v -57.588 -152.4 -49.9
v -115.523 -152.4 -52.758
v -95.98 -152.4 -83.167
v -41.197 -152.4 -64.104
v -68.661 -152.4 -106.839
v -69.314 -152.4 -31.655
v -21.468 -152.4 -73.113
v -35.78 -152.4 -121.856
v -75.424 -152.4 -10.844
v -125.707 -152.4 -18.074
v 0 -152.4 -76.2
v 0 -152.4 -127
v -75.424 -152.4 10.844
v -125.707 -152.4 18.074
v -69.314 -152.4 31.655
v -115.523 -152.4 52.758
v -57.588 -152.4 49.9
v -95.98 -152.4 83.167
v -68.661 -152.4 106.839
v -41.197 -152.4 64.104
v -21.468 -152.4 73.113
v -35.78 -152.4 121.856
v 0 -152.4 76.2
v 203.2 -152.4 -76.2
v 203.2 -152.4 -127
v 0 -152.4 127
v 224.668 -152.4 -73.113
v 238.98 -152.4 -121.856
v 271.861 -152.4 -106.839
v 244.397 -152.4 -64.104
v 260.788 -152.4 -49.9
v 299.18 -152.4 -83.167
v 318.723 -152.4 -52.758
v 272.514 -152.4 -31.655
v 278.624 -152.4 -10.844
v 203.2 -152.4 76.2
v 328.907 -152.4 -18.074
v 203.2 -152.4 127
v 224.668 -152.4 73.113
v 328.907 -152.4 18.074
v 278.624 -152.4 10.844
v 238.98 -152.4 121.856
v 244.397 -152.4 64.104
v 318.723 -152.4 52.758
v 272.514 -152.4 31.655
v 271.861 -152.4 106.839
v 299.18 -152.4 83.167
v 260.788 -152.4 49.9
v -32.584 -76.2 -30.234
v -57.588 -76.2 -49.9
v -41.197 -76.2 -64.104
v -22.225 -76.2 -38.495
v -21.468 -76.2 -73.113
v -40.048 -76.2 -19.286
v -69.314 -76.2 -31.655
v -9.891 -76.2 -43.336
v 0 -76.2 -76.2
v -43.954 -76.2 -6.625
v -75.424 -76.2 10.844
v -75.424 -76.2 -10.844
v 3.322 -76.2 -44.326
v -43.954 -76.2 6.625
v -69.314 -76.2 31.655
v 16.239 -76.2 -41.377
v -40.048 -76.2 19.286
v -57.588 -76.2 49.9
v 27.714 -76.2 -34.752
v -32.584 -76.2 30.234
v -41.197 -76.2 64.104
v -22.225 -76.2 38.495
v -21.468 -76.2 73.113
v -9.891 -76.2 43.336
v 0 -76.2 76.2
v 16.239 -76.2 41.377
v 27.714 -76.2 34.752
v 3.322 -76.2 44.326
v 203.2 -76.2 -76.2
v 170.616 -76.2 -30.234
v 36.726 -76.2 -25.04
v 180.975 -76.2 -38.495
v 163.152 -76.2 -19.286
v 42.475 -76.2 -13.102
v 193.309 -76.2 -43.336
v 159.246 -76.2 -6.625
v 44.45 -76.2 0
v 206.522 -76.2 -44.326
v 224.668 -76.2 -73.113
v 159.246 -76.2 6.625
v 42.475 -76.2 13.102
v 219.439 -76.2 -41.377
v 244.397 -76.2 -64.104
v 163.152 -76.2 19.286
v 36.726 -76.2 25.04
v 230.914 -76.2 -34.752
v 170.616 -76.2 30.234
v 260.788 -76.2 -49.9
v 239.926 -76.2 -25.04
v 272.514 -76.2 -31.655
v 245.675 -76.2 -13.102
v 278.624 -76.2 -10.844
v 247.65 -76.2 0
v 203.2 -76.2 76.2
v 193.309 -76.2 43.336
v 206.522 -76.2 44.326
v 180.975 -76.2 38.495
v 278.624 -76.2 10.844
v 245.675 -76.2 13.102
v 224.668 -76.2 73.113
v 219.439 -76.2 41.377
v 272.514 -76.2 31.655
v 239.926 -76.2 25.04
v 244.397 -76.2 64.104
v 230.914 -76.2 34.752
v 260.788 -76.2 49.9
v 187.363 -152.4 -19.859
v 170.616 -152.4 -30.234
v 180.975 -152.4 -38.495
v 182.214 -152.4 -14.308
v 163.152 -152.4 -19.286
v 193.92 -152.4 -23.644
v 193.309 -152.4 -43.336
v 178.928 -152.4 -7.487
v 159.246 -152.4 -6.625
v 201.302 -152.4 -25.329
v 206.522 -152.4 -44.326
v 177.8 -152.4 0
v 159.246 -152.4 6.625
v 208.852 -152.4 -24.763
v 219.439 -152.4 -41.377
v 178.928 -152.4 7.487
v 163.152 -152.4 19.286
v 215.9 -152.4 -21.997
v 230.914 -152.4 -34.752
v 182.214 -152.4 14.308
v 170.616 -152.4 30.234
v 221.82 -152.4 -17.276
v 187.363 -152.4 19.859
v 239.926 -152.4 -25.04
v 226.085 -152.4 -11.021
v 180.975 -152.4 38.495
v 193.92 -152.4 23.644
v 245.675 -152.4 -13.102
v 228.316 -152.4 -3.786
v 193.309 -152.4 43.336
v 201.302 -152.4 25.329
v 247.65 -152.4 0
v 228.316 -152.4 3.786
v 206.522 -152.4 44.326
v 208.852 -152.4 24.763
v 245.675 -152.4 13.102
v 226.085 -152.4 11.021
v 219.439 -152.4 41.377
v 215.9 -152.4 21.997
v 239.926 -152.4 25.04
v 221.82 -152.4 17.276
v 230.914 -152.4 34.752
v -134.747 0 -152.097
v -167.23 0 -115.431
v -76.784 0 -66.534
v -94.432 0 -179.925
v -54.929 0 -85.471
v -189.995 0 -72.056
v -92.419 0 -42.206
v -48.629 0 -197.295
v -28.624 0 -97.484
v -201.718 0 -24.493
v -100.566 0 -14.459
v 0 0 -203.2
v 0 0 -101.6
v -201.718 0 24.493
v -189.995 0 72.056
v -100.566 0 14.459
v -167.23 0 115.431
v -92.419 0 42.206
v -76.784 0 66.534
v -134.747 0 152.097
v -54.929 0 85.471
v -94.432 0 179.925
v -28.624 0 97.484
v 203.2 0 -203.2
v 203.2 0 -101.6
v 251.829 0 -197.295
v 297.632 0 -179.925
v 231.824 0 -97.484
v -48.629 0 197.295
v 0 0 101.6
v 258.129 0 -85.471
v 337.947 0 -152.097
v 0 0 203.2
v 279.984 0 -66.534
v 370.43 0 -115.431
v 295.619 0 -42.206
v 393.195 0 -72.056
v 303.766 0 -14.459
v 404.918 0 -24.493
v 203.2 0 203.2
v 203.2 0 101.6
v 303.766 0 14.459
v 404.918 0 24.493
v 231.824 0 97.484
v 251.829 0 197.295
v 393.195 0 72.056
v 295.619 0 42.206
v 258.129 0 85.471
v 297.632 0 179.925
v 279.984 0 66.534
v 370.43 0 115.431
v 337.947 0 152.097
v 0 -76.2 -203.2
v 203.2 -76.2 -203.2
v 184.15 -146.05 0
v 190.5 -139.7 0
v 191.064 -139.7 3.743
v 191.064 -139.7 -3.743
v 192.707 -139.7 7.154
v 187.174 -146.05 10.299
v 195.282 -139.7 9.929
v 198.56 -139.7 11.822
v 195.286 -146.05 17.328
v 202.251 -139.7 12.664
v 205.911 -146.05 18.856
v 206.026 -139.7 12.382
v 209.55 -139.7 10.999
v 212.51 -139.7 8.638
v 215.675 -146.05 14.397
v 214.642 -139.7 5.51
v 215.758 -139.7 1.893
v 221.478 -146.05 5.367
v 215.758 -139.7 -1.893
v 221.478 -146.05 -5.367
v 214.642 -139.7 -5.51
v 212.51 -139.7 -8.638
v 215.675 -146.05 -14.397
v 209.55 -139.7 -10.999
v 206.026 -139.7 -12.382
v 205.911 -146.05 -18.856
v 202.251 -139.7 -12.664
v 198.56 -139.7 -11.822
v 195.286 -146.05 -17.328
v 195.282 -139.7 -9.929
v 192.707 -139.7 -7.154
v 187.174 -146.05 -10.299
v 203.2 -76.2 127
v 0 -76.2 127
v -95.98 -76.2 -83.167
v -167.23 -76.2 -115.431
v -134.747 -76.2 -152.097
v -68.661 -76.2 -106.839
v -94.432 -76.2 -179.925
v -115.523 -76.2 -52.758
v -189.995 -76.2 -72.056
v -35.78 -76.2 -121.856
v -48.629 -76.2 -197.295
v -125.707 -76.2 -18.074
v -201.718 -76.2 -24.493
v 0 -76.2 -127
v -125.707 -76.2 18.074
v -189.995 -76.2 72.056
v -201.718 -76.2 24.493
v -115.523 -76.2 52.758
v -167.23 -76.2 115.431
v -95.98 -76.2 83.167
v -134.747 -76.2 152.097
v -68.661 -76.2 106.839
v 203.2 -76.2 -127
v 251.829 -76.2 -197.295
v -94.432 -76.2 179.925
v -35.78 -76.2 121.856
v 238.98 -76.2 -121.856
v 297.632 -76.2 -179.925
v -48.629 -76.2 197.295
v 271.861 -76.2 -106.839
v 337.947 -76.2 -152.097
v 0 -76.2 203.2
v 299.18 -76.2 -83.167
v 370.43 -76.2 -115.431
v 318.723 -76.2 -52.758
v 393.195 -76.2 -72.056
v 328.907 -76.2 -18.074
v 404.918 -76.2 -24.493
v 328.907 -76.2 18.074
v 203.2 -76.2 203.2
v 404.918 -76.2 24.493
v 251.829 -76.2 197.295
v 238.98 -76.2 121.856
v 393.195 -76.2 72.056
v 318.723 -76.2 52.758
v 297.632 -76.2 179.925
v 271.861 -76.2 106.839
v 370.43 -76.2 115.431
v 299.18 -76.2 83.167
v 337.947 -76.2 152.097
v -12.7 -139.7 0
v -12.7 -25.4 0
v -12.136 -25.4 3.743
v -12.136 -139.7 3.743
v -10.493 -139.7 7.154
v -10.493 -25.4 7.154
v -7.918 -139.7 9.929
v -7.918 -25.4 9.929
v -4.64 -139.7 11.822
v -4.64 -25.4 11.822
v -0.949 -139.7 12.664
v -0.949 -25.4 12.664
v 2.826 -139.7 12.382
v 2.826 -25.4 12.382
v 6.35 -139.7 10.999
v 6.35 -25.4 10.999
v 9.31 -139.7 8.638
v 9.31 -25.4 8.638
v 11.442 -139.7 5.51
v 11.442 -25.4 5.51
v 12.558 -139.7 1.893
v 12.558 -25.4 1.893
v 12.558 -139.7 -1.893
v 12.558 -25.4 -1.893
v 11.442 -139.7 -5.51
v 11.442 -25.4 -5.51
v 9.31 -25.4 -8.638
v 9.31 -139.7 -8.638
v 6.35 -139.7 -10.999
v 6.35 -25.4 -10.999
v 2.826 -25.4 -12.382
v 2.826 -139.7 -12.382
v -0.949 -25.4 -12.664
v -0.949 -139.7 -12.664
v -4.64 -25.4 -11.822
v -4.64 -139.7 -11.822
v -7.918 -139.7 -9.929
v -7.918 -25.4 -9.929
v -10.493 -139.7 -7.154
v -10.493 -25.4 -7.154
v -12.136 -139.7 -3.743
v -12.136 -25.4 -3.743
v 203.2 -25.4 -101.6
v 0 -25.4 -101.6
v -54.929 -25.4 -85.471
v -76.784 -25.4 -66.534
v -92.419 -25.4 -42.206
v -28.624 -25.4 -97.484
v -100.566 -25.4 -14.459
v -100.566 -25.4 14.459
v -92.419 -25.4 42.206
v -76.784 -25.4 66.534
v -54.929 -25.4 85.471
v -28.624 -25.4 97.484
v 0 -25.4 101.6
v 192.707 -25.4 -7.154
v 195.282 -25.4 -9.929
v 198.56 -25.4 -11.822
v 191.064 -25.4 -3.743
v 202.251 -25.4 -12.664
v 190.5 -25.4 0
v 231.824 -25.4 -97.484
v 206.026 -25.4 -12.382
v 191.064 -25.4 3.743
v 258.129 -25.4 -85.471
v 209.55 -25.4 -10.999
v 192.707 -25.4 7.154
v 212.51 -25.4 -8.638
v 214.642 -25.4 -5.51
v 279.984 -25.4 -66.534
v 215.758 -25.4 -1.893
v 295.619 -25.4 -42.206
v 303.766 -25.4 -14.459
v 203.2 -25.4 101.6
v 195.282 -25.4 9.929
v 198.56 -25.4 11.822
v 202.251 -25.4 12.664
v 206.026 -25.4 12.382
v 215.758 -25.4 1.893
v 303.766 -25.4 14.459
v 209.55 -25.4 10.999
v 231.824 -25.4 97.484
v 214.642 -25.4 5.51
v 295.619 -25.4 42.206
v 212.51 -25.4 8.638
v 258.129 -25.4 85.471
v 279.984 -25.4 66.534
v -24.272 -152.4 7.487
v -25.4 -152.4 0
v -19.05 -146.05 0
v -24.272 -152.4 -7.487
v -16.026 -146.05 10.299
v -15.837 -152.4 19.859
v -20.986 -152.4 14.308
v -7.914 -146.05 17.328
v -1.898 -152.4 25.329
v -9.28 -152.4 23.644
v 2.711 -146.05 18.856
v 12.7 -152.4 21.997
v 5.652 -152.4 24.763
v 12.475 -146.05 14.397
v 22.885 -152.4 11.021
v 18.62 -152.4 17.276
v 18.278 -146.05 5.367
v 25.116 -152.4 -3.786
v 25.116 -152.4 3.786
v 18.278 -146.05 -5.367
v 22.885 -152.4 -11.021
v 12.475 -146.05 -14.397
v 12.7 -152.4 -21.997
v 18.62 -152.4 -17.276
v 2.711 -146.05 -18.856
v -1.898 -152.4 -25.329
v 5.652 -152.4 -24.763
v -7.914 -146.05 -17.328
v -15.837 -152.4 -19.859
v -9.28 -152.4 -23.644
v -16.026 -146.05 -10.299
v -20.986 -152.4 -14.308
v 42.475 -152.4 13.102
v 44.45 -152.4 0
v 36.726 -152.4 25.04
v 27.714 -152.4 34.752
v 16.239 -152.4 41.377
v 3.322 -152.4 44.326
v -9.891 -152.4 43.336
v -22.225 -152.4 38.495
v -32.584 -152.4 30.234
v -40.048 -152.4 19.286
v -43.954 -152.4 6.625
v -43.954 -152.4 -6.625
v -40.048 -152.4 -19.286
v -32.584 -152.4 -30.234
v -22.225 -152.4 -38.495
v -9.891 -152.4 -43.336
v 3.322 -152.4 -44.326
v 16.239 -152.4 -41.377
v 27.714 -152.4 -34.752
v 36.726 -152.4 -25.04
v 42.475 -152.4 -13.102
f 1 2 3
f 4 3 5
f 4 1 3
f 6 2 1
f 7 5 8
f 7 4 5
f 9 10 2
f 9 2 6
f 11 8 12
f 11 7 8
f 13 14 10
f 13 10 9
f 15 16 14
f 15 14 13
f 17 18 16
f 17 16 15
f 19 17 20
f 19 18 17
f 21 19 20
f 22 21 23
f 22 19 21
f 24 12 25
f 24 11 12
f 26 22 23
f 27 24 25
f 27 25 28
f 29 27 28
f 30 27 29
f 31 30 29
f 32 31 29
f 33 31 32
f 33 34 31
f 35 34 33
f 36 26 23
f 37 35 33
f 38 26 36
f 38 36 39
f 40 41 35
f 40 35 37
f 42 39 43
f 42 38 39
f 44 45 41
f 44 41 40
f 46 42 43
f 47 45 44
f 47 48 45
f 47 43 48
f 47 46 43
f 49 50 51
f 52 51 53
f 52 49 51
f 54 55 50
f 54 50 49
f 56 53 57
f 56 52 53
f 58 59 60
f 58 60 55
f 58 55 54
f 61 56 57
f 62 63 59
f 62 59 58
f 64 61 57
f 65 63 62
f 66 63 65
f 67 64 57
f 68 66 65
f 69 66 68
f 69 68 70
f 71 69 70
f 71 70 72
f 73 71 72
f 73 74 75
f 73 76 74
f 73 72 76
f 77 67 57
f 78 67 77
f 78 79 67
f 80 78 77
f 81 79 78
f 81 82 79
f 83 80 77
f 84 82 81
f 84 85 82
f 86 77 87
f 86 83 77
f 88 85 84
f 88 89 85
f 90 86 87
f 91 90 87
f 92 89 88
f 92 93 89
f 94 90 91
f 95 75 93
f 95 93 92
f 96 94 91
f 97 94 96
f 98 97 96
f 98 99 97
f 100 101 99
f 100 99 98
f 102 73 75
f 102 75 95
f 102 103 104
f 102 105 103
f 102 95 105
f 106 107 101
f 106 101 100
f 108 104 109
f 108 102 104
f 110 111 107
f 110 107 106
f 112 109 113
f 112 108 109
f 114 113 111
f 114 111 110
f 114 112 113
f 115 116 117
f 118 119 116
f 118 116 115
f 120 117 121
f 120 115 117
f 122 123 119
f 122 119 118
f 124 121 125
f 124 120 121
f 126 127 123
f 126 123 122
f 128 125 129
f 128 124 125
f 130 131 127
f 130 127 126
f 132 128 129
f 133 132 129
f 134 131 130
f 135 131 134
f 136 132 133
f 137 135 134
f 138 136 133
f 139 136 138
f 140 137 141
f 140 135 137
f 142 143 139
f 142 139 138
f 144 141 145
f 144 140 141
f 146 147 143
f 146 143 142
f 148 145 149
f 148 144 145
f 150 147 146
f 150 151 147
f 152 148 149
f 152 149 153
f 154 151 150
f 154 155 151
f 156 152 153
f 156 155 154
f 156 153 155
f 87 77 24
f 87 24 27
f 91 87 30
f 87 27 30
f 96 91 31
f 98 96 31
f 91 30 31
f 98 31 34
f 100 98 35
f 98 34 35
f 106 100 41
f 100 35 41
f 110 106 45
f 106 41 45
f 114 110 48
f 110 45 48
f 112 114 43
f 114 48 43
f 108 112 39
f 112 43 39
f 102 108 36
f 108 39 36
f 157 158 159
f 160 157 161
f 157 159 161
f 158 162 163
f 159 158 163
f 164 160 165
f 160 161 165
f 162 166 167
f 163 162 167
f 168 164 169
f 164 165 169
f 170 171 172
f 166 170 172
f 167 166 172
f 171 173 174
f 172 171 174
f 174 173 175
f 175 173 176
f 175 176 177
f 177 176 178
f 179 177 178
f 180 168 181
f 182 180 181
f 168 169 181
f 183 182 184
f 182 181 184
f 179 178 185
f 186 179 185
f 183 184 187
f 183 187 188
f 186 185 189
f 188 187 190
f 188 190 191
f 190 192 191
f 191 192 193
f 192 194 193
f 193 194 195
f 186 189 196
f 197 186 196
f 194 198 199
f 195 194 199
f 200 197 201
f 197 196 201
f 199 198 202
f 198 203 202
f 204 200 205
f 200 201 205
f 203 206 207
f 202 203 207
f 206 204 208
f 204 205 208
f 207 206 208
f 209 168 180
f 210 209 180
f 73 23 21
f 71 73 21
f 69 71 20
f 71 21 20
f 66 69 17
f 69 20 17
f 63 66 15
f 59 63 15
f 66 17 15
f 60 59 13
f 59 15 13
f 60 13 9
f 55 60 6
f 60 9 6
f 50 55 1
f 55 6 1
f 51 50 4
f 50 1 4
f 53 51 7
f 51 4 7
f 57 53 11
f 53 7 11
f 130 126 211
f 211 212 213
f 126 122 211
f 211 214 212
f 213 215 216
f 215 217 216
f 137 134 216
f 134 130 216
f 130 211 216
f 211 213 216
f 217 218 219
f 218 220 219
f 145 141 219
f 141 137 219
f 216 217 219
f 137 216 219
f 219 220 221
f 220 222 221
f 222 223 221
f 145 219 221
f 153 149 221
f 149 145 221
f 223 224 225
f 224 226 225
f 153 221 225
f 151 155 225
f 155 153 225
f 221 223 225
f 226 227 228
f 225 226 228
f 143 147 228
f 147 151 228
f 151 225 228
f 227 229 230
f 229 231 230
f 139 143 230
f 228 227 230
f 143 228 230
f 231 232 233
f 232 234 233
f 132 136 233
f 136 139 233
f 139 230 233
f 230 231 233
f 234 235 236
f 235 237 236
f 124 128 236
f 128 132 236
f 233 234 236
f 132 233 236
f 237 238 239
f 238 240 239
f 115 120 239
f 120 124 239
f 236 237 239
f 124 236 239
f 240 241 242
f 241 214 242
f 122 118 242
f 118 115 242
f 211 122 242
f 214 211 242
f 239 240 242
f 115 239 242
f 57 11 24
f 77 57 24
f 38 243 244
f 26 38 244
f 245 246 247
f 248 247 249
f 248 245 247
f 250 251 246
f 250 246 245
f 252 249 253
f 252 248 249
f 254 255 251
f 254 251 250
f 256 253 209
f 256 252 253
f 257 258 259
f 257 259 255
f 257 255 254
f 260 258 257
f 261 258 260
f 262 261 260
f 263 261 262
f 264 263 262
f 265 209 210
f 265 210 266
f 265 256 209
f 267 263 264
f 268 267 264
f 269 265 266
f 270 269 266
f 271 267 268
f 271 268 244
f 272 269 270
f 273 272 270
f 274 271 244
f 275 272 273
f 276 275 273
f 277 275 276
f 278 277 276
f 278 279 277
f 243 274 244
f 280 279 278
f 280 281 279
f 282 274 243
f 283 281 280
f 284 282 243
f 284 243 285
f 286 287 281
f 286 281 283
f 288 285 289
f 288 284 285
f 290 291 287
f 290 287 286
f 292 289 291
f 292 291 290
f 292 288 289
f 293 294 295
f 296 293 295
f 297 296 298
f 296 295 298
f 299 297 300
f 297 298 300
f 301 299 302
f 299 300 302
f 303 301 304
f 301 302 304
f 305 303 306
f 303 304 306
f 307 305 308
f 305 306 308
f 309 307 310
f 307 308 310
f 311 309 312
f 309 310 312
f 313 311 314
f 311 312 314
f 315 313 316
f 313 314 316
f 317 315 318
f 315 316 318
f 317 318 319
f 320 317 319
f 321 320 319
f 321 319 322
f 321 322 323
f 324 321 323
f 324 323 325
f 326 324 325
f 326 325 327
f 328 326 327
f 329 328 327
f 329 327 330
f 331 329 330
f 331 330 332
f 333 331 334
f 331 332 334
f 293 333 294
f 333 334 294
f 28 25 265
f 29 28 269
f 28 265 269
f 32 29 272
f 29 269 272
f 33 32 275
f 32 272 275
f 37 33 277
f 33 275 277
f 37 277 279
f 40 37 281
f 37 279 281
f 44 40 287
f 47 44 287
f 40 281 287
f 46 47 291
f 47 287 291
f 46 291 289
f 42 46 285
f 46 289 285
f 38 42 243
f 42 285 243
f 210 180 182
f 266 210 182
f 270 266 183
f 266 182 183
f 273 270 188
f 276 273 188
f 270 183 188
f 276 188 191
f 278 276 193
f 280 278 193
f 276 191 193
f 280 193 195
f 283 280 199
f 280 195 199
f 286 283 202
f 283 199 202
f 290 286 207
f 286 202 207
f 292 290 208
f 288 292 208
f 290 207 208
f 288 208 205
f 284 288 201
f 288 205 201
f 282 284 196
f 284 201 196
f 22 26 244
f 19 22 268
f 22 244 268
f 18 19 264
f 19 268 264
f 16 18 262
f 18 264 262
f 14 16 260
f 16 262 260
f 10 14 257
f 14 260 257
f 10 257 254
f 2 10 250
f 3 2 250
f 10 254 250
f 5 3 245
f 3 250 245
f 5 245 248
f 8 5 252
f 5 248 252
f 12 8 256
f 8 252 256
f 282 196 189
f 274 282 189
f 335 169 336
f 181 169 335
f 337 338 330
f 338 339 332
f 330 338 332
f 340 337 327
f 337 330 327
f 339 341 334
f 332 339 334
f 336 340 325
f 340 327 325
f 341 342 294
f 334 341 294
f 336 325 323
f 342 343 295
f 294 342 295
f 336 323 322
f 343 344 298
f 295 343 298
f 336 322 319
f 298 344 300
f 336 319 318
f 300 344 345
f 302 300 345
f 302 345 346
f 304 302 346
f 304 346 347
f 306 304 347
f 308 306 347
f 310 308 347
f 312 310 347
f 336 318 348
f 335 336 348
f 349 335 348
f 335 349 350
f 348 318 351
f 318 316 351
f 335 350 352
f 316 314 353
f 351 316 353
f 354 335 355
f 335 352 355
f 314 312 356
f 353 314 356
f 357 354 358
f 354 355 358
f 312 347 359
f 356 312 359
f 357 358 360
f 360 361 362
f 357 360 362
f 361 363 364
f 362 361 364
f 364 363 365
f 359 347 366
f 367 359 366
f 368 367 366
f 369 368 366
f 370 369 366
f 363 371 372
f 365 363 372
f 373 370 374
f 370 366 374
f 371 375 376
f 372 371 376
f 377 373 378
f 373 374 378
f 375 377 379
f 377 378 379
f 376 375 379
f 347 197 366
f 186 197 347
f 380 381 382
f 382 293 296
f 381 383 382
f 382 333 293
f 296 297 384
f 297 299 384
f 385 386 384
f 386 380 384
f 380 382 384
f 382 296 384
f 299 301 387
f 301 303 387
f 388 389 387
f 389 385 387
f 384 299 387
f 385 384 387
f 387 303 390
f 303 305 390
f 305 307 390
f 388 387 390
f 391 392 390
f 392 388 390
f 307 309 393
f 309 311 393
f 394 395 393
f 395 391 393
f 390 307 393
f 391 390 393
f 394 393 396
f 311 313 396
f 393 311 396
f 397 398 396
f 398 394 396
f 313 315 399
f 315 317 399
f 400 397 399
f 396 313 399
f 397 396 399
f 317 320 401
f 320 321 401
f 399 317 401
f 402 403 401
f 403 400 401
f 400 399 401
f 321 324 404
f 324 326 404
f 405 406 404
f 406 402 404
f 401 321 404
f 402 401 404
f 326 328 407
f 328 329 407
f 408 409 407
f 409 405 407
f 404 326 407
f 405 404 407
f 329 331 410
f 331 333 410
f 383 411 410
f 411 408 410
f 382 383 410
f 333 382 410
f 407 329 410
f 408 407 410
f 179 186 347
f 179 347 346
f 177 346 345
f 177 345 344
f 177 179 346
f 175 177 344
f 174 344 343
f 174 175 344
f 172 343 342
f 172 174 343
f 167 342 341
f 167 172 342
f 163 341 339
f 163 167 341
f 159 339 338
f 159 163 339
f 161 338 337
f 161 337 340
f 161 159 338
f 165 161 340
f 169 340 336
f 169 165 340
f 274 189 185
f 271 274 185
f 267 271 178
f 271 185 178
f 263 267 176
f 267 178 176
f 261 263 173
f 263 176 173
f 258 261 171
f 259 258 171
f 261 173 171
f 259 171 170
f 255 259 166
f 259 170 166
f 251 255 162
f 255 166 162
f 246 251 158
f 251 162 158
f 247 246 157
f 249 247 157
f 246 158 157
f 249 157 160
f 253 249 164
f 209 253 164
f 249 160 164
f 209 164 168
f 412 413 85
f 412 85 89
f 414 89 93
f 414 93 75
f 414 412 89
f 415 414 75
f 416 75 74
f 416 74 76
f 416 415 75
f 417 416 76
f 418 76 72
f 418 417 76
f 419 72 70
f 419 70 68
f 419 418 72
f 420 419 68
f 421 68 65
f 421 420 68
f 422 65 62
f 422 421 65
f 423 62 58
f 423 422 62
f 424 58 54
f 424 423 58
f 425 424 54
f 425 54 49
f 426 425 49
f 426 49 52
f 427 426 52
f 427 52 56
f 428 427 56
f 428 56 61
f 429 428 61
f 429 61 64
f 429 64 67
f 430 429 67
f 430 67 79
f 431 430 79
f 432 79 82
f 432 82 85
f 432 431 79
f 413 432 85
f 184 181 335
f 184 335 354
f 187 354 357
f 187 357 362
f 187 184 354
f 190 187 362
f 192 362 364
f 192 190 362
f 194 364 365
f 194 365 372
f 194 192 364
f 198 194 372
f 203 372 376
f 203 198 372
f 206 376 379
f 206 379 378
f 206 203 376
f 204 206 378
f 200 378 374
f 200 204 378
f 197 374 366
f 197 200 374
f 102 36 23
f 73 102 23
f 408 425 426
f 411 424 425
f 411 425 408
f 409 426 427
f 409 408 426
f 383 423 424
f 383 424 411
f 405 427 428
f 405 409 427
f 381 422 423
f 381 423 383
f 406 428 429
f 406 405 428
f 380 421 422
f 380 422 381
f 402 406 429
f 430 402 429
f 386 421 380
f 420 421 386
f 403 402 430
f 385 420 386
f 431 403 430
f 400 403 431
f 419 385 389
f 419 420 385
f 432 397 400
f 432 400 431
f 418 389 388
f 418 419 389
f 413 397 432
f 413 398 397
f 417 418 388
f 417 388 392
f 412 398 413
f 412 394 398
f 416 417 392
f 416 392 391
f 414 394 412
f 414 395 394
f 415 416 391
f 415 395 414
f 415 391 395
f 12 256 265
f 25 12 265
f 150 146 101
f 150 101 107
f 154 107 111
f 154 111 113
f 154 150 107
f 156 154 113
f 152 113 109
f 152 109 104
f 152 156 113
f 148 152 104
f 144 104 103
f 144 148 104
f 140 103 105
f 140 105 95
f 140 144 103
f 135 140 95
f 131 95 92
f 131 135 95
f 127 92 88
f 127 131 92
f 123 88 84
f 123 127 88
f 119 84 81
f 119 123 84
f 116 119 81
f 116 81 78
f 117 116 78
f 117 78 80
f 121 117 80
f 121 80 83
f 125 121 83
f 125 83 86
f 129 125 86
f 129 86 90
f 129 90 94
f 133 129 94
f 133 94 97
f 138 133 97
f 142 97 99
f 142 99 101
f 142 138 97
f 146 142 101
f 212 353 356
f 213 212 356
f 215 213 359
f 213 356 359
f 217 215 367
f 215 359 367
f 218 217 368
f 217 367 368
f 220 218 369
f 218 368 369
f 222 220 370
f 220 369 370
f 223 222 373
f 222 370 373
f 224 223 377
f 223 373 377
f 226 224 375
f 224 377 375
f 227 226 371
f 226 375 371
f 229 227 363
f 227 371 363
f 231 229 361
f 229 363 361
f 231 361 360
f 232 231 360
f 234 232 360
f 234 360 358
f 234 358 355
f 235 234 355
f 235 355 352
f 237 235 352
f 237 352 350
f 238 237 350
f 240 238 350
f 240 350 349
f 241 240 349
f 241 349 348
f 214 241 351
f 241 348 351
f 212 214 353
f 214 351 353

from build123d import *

# Parameters (mm, degrees)
F1_DEPTH       = 76.2
F2_DEPTH       = 152.4
F3_R           = 44.45
F4_DEPTH       = 76.2
F6_D           = 25.4
F6_CSINK_D     = 50.8
F6_CSINK_ANGLE = 90
F8_DEPTH       = 25.4


with BuildPart() as f1:
    # F0 (on Front) → F1 (new body)
    with BuildSketch(Plane.XZ):
        with BuildLine():
            Line((203.2, 203.2), (0, 203.2))
            ThreePointArc((0, 203.2), (-203.2, 0), (0, -203.2))
            Line((0, -203.2), (203.2, -203.2))
            ThreePointArc((203.2, -203.2), (406.4, 0), (203.2, 203.2))
        make_face()
        with BuildLine():
            ThreePointArc((0, -127), (-127, 0), (0, 127))
            Line((0, 127), (203.2, 127))
            ThreePointArc((203.2, 127), (330.2, 0), (203.2, -127))
            Line((203.2, -127), (0, -127))
        make_face(mode=Mode.SUBTRACT)
        with BuildLine():
            Line((203.2, 127), (0, 127))
            ThreePointArc((0, 127), (-127, 0), (0, -127))
            Line((0, -127), (203.2, -127))
            ThreePointArc((203.2, -127), (330.2, 0), (203.2, 127))
        make_face()
    extrude(amount=F1_DEPTH)

    # F0 (on Front) → F2 (join)
    with BuildSketch(Plane.XZ):
        with BuildLine():
            Line((203.2, 127), (0, 127))
            ThreePointArc((0, 127), (-127, 0), (0, -127))
            Line((0, -127), (203.2, -127))
            ThreePointArc((203.2, -127), (330.2, 0), (203.2, 127))
        make_face()
    extrude(amount=F2_DEPTH)

    # F3 (on face) → F4 (cut)
    with BuildSketch(Plane.XZ.offset(152.4)):
        with BuildLine():
            Line((203.2, 76.2), (0, 76.2))
            ThreePointArc((0, 76.2), (-76.2, 0), (0, -76.2))
            Line((0, -76.2), (203.2, -76.2))
            ThreePointArc((203.2, -76.2), (279.4, 0), (203.2, 76.2))
        make_face()
        Circle(F3_R, mode=Mode.SUBTRACT)
        with Locations((203.2, 0)):
            Circle(F3_R, mode=Mode.SUBTRACT)
    extrude(amount=-F4_DEPTH, mode=Mode.SUBTRACT)

    # F6 (through all)
    with Locations(Plane.XZ.offset(152.4)):
        with Locations((0, 0), (203.2, 0)):
            CounterSinkHole(F6_D / 2, F6_CSINK_D / 2, counter_sink_angle=F6_CSINK_ANGLE)

    # F7 (on face) → F8 (cut)
    with BuildSketch(Plane.XZ):
        with BuildLine():
            Line((203.2, 101.6), (0, 101.6))
            ThreePointArc((0, 101.6), (-101.6, 0), (0, -101.6))
            Line((0, -101.6), (203.2, -101.6))
            ThreePointArc((203.2, -101.6), (304.8, 0), (203.2, 101.6))
        make_face()
    extrude(amount=F8_DEPTH, mode=Mode.SUBTRACT)


solid = f1.part
